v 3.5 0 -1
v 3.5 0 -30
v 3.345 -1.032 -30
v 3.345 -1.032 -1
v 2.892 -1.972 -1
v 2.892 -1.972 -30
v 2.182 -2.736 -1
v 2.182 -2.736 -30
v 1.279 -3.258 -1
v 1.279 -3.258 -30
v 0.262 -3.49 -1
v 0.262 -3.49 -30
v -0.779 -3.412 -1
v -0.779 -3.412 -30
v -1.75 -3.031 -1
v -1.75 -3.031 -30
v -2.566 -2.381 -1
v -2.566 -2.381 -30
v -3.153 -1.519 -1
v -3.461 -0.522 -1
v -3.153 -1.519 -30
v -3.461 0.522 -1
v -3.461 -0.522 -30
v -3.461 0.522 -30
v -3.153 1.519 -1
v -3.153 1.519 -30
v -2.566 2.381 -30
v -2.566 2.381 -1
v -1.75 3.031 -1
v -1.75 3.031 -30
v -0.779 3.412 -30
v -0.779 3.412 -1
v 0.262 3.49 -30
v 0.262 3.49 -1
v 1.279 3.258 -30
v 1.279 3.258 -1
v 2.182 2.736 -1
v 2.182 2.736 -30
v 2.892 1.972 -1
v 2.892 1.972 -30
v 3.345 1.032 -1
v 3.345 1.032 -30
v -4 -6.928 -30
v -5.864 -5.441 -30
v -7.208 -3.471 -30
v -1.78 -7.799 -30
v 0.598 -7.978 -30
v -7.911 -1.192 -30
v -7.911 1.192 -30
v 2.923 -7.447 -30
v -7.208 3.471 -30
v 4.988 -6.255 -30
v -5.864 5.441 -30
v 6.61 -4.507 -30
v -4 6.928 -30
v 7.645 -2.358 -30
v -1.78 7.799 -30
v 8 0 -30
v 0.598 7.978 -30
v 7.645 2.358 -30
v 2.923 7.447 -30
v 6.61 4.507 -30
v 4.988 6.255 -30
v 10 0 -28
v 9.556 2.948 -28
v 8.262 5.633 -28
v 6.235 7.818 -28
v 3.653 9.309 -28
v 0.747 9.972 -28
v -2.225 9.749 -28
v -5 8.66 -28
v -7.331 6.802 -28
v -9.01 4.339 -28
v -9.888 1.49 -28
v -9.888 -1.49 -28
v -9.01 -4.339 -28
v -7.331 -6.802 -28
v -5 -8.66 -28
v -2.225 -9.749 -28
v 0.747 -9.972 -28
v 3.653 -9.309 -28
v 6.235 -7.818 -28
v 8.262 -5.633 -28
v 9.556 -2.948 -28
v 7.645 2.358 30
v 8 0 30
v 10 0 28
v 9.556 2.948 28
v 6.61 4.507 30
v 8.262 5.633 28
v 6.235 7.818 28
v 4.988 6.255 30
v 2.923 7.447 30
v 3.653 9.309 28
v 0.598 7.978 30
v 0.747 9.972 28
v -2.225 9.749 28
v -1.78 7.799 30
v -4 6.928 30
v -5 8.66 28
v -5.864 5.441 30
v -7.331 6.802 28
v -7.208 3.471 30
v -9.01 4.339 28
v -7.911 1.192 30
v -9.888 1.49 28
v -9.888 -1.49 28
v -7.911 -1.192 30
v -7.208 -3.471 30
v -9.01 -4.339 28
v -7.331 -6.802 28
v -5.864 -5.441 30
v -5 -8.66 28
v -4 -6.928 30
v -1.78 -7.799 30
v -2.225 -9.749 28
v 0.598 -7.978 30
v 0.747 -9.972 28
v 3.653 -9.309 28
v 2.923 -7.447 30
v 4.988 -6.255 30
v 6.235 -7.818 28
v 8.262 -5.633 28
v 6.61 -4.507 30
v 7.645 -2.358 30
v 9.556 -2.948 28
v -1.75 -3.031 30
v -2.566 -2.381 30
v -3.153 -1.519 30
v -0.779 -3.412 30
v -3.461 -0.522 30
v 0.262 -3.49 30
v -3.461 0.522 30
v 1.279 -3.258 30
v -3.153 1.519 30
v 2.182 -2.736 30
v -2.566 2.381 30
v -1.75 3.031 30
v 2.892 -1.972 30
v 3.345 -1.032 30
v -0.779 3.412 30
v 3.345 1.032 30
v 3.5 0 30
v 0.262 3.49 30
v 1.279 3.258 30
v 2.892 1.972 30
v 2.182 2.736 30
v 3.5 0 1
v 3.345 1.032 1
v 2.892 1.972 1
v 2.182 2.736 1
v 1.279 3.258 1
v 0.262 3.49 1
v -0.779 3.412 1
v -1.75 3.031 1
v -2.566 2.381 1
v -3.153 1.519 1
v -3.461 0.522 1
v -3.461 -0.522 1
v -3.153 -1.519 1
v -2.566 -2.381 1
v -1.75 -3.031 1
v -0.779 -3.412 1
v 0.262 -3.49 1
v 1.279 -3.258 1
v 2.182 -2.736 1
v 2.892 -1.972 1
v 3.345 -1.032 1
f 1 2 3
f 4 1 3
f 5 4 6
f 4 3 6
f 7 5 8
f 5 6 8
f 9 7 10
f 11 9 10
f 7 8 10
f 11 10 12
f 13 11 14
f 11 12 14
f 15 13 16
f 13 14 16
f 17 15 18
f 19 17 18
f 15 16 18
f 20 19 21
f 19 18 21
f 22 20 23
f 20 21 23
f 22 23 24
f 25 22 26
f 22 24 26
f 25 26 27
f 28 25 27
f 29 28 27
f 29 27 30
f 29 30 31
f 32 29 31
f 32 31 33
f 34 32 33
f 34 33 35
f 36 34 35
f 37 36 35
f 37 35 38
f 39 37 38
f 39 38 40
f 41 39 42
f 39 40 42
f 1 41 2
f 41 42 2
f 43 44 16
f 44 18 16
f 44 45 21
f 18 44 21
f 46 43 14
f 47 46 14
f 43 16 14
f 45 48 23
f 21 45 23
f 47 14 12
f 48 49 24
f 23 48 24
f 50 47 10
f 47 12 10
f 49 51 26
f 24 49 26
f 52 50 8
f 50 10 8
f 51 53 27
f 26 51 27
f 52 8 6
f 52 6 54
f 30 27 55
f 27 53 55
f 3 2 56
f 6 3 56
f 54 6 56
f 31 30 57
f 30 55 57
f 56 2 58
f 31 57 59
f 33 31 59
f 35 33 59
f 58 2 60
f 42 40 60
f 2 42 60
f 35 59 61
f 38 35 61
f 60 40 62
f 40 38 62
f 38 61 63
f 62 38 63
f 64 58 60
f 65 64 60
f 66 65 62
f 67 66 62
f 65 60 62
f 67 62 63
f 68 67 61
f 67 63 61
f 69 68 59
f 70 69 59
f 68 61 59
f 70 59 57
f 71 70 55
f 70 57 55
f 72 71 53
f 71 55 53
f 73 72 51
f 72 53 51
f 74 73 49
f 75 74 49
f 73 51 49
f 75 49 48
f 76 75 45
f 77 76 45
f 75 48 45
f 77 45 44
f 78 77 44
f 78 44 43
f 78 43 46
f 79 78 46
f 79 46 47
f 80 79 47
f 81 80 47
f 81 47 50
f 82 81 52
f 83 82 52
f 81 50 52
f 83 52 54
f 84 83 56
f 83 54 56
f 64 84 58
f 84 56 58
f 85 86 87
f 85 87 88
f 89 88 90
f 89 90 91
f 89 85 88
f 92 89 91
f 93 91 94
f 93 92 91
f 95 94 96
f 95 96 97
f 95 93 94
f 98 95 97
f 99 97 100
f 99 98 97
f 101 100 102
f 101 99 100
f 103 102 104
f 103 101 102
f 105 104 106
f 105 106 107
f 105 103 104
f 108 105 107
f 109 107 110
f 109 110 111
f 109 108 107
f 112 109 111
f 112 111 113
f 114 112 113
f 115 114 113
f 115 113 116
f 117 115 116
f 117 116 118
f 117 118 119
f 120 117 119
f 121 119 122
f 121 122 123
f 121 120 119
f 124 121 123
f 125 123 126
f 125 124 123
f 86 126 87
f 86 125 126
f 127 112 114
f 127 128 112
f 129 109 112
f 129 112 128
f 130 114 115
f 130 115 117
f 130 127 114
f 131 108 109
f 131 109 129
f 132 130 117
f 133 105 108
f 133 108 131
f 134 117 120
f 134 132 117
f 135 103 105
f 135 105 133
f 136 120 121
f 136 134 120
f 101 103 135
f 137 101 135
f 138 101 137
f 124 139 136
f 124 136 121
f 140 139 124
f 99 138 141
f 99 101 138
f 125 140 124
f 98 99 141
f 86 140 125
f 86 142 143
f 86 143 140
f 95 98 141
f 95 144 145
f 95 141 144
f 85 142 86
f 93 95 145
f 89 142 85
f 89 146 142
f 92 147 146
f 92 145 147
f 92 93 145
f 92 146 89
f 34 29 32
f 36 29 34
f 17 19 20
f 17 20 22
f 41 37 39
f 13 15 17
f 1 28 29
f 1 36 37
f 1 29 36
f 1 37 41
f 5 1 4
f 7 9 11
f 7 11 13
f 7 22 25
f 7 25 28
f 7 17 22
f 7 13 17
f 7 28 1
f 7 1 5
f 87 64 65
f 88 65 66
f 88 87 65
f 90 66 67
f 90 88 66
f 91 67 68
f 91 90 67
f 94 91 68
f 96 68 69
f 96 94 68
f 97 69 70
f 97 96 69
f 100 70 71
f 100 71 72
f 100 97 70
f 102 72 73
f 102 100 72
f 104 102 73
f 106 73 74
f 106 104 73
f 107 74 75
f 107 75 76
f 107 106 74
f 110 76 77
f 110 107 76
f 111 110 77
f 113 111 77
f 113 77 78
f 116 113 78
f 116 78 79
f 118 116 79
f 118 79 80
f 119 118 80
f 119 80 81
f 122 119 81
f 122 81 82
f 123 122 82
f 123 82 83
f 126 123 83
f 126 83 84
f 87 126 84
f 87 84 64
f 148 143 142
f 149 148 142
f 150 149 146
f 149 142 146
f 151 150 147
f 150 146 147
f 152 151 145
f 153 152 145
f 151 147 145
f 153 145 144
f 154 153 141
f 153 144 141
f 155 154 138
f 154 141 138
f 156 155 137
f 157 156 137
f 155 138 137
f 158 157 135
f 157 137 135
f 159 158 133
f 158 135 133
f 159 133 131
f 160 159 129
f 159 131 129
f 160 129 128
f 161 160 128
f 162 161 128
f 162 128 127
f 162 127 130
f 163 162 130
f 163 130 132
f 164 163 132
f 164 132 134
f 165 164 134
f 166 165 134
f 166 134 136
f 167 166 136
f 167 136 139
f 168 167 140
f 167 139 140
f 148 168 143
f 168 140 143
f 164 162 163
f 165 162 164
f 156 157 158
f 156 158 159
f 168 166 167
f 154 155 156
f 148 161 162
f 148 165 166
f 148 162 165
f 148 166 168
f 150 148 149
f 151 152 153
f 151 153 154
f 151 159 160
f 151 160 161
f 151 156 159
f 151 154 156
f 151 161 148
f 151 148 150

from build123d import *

# Parameters (mm, degrees)
F0_R     = 10
F1_DEPTH = 30
F2_R     = 3.5
F4_DEPTH = 29
F3_R     = 3.5
F5_DEPTH = 29
F6_SIZE  = 2


with BuildPart() as f1:
    # F0 (on Top) → F1 (new body, symmetric)
    with BuildSketch(Plane.XY):
        Circle(F0_R)
    extrude(amount=F1_DEPTH, both=True)

    # F2 (on face) → F4 (cut)
    with BuildSketch(Plane(origin=(0, 0, -30), x_dir=(1, 0, 0), z_dir=(0, 0, -1))):
        Circle(F2_R)
    extrude(amount=-F4_DEPTH, mode=Mode.SUBTRACT)

    # F3 (on face) → F5 (cut)
    with BuildSketch(Plane.XY.offset(30)):
        Circle(F3_R)
    extrude(amount=-F5_DEPTH, mode=Mode.SUBTRACT)

    # F6
    f6_edges = [f1.edges().sort_by_distance(p)[0] for p in [
        (-10, 0, 30),
        (-10, 0, -30),
    ]]
    chamfer(f6_edges, length=F6_SIZE)


solid = f1.part
